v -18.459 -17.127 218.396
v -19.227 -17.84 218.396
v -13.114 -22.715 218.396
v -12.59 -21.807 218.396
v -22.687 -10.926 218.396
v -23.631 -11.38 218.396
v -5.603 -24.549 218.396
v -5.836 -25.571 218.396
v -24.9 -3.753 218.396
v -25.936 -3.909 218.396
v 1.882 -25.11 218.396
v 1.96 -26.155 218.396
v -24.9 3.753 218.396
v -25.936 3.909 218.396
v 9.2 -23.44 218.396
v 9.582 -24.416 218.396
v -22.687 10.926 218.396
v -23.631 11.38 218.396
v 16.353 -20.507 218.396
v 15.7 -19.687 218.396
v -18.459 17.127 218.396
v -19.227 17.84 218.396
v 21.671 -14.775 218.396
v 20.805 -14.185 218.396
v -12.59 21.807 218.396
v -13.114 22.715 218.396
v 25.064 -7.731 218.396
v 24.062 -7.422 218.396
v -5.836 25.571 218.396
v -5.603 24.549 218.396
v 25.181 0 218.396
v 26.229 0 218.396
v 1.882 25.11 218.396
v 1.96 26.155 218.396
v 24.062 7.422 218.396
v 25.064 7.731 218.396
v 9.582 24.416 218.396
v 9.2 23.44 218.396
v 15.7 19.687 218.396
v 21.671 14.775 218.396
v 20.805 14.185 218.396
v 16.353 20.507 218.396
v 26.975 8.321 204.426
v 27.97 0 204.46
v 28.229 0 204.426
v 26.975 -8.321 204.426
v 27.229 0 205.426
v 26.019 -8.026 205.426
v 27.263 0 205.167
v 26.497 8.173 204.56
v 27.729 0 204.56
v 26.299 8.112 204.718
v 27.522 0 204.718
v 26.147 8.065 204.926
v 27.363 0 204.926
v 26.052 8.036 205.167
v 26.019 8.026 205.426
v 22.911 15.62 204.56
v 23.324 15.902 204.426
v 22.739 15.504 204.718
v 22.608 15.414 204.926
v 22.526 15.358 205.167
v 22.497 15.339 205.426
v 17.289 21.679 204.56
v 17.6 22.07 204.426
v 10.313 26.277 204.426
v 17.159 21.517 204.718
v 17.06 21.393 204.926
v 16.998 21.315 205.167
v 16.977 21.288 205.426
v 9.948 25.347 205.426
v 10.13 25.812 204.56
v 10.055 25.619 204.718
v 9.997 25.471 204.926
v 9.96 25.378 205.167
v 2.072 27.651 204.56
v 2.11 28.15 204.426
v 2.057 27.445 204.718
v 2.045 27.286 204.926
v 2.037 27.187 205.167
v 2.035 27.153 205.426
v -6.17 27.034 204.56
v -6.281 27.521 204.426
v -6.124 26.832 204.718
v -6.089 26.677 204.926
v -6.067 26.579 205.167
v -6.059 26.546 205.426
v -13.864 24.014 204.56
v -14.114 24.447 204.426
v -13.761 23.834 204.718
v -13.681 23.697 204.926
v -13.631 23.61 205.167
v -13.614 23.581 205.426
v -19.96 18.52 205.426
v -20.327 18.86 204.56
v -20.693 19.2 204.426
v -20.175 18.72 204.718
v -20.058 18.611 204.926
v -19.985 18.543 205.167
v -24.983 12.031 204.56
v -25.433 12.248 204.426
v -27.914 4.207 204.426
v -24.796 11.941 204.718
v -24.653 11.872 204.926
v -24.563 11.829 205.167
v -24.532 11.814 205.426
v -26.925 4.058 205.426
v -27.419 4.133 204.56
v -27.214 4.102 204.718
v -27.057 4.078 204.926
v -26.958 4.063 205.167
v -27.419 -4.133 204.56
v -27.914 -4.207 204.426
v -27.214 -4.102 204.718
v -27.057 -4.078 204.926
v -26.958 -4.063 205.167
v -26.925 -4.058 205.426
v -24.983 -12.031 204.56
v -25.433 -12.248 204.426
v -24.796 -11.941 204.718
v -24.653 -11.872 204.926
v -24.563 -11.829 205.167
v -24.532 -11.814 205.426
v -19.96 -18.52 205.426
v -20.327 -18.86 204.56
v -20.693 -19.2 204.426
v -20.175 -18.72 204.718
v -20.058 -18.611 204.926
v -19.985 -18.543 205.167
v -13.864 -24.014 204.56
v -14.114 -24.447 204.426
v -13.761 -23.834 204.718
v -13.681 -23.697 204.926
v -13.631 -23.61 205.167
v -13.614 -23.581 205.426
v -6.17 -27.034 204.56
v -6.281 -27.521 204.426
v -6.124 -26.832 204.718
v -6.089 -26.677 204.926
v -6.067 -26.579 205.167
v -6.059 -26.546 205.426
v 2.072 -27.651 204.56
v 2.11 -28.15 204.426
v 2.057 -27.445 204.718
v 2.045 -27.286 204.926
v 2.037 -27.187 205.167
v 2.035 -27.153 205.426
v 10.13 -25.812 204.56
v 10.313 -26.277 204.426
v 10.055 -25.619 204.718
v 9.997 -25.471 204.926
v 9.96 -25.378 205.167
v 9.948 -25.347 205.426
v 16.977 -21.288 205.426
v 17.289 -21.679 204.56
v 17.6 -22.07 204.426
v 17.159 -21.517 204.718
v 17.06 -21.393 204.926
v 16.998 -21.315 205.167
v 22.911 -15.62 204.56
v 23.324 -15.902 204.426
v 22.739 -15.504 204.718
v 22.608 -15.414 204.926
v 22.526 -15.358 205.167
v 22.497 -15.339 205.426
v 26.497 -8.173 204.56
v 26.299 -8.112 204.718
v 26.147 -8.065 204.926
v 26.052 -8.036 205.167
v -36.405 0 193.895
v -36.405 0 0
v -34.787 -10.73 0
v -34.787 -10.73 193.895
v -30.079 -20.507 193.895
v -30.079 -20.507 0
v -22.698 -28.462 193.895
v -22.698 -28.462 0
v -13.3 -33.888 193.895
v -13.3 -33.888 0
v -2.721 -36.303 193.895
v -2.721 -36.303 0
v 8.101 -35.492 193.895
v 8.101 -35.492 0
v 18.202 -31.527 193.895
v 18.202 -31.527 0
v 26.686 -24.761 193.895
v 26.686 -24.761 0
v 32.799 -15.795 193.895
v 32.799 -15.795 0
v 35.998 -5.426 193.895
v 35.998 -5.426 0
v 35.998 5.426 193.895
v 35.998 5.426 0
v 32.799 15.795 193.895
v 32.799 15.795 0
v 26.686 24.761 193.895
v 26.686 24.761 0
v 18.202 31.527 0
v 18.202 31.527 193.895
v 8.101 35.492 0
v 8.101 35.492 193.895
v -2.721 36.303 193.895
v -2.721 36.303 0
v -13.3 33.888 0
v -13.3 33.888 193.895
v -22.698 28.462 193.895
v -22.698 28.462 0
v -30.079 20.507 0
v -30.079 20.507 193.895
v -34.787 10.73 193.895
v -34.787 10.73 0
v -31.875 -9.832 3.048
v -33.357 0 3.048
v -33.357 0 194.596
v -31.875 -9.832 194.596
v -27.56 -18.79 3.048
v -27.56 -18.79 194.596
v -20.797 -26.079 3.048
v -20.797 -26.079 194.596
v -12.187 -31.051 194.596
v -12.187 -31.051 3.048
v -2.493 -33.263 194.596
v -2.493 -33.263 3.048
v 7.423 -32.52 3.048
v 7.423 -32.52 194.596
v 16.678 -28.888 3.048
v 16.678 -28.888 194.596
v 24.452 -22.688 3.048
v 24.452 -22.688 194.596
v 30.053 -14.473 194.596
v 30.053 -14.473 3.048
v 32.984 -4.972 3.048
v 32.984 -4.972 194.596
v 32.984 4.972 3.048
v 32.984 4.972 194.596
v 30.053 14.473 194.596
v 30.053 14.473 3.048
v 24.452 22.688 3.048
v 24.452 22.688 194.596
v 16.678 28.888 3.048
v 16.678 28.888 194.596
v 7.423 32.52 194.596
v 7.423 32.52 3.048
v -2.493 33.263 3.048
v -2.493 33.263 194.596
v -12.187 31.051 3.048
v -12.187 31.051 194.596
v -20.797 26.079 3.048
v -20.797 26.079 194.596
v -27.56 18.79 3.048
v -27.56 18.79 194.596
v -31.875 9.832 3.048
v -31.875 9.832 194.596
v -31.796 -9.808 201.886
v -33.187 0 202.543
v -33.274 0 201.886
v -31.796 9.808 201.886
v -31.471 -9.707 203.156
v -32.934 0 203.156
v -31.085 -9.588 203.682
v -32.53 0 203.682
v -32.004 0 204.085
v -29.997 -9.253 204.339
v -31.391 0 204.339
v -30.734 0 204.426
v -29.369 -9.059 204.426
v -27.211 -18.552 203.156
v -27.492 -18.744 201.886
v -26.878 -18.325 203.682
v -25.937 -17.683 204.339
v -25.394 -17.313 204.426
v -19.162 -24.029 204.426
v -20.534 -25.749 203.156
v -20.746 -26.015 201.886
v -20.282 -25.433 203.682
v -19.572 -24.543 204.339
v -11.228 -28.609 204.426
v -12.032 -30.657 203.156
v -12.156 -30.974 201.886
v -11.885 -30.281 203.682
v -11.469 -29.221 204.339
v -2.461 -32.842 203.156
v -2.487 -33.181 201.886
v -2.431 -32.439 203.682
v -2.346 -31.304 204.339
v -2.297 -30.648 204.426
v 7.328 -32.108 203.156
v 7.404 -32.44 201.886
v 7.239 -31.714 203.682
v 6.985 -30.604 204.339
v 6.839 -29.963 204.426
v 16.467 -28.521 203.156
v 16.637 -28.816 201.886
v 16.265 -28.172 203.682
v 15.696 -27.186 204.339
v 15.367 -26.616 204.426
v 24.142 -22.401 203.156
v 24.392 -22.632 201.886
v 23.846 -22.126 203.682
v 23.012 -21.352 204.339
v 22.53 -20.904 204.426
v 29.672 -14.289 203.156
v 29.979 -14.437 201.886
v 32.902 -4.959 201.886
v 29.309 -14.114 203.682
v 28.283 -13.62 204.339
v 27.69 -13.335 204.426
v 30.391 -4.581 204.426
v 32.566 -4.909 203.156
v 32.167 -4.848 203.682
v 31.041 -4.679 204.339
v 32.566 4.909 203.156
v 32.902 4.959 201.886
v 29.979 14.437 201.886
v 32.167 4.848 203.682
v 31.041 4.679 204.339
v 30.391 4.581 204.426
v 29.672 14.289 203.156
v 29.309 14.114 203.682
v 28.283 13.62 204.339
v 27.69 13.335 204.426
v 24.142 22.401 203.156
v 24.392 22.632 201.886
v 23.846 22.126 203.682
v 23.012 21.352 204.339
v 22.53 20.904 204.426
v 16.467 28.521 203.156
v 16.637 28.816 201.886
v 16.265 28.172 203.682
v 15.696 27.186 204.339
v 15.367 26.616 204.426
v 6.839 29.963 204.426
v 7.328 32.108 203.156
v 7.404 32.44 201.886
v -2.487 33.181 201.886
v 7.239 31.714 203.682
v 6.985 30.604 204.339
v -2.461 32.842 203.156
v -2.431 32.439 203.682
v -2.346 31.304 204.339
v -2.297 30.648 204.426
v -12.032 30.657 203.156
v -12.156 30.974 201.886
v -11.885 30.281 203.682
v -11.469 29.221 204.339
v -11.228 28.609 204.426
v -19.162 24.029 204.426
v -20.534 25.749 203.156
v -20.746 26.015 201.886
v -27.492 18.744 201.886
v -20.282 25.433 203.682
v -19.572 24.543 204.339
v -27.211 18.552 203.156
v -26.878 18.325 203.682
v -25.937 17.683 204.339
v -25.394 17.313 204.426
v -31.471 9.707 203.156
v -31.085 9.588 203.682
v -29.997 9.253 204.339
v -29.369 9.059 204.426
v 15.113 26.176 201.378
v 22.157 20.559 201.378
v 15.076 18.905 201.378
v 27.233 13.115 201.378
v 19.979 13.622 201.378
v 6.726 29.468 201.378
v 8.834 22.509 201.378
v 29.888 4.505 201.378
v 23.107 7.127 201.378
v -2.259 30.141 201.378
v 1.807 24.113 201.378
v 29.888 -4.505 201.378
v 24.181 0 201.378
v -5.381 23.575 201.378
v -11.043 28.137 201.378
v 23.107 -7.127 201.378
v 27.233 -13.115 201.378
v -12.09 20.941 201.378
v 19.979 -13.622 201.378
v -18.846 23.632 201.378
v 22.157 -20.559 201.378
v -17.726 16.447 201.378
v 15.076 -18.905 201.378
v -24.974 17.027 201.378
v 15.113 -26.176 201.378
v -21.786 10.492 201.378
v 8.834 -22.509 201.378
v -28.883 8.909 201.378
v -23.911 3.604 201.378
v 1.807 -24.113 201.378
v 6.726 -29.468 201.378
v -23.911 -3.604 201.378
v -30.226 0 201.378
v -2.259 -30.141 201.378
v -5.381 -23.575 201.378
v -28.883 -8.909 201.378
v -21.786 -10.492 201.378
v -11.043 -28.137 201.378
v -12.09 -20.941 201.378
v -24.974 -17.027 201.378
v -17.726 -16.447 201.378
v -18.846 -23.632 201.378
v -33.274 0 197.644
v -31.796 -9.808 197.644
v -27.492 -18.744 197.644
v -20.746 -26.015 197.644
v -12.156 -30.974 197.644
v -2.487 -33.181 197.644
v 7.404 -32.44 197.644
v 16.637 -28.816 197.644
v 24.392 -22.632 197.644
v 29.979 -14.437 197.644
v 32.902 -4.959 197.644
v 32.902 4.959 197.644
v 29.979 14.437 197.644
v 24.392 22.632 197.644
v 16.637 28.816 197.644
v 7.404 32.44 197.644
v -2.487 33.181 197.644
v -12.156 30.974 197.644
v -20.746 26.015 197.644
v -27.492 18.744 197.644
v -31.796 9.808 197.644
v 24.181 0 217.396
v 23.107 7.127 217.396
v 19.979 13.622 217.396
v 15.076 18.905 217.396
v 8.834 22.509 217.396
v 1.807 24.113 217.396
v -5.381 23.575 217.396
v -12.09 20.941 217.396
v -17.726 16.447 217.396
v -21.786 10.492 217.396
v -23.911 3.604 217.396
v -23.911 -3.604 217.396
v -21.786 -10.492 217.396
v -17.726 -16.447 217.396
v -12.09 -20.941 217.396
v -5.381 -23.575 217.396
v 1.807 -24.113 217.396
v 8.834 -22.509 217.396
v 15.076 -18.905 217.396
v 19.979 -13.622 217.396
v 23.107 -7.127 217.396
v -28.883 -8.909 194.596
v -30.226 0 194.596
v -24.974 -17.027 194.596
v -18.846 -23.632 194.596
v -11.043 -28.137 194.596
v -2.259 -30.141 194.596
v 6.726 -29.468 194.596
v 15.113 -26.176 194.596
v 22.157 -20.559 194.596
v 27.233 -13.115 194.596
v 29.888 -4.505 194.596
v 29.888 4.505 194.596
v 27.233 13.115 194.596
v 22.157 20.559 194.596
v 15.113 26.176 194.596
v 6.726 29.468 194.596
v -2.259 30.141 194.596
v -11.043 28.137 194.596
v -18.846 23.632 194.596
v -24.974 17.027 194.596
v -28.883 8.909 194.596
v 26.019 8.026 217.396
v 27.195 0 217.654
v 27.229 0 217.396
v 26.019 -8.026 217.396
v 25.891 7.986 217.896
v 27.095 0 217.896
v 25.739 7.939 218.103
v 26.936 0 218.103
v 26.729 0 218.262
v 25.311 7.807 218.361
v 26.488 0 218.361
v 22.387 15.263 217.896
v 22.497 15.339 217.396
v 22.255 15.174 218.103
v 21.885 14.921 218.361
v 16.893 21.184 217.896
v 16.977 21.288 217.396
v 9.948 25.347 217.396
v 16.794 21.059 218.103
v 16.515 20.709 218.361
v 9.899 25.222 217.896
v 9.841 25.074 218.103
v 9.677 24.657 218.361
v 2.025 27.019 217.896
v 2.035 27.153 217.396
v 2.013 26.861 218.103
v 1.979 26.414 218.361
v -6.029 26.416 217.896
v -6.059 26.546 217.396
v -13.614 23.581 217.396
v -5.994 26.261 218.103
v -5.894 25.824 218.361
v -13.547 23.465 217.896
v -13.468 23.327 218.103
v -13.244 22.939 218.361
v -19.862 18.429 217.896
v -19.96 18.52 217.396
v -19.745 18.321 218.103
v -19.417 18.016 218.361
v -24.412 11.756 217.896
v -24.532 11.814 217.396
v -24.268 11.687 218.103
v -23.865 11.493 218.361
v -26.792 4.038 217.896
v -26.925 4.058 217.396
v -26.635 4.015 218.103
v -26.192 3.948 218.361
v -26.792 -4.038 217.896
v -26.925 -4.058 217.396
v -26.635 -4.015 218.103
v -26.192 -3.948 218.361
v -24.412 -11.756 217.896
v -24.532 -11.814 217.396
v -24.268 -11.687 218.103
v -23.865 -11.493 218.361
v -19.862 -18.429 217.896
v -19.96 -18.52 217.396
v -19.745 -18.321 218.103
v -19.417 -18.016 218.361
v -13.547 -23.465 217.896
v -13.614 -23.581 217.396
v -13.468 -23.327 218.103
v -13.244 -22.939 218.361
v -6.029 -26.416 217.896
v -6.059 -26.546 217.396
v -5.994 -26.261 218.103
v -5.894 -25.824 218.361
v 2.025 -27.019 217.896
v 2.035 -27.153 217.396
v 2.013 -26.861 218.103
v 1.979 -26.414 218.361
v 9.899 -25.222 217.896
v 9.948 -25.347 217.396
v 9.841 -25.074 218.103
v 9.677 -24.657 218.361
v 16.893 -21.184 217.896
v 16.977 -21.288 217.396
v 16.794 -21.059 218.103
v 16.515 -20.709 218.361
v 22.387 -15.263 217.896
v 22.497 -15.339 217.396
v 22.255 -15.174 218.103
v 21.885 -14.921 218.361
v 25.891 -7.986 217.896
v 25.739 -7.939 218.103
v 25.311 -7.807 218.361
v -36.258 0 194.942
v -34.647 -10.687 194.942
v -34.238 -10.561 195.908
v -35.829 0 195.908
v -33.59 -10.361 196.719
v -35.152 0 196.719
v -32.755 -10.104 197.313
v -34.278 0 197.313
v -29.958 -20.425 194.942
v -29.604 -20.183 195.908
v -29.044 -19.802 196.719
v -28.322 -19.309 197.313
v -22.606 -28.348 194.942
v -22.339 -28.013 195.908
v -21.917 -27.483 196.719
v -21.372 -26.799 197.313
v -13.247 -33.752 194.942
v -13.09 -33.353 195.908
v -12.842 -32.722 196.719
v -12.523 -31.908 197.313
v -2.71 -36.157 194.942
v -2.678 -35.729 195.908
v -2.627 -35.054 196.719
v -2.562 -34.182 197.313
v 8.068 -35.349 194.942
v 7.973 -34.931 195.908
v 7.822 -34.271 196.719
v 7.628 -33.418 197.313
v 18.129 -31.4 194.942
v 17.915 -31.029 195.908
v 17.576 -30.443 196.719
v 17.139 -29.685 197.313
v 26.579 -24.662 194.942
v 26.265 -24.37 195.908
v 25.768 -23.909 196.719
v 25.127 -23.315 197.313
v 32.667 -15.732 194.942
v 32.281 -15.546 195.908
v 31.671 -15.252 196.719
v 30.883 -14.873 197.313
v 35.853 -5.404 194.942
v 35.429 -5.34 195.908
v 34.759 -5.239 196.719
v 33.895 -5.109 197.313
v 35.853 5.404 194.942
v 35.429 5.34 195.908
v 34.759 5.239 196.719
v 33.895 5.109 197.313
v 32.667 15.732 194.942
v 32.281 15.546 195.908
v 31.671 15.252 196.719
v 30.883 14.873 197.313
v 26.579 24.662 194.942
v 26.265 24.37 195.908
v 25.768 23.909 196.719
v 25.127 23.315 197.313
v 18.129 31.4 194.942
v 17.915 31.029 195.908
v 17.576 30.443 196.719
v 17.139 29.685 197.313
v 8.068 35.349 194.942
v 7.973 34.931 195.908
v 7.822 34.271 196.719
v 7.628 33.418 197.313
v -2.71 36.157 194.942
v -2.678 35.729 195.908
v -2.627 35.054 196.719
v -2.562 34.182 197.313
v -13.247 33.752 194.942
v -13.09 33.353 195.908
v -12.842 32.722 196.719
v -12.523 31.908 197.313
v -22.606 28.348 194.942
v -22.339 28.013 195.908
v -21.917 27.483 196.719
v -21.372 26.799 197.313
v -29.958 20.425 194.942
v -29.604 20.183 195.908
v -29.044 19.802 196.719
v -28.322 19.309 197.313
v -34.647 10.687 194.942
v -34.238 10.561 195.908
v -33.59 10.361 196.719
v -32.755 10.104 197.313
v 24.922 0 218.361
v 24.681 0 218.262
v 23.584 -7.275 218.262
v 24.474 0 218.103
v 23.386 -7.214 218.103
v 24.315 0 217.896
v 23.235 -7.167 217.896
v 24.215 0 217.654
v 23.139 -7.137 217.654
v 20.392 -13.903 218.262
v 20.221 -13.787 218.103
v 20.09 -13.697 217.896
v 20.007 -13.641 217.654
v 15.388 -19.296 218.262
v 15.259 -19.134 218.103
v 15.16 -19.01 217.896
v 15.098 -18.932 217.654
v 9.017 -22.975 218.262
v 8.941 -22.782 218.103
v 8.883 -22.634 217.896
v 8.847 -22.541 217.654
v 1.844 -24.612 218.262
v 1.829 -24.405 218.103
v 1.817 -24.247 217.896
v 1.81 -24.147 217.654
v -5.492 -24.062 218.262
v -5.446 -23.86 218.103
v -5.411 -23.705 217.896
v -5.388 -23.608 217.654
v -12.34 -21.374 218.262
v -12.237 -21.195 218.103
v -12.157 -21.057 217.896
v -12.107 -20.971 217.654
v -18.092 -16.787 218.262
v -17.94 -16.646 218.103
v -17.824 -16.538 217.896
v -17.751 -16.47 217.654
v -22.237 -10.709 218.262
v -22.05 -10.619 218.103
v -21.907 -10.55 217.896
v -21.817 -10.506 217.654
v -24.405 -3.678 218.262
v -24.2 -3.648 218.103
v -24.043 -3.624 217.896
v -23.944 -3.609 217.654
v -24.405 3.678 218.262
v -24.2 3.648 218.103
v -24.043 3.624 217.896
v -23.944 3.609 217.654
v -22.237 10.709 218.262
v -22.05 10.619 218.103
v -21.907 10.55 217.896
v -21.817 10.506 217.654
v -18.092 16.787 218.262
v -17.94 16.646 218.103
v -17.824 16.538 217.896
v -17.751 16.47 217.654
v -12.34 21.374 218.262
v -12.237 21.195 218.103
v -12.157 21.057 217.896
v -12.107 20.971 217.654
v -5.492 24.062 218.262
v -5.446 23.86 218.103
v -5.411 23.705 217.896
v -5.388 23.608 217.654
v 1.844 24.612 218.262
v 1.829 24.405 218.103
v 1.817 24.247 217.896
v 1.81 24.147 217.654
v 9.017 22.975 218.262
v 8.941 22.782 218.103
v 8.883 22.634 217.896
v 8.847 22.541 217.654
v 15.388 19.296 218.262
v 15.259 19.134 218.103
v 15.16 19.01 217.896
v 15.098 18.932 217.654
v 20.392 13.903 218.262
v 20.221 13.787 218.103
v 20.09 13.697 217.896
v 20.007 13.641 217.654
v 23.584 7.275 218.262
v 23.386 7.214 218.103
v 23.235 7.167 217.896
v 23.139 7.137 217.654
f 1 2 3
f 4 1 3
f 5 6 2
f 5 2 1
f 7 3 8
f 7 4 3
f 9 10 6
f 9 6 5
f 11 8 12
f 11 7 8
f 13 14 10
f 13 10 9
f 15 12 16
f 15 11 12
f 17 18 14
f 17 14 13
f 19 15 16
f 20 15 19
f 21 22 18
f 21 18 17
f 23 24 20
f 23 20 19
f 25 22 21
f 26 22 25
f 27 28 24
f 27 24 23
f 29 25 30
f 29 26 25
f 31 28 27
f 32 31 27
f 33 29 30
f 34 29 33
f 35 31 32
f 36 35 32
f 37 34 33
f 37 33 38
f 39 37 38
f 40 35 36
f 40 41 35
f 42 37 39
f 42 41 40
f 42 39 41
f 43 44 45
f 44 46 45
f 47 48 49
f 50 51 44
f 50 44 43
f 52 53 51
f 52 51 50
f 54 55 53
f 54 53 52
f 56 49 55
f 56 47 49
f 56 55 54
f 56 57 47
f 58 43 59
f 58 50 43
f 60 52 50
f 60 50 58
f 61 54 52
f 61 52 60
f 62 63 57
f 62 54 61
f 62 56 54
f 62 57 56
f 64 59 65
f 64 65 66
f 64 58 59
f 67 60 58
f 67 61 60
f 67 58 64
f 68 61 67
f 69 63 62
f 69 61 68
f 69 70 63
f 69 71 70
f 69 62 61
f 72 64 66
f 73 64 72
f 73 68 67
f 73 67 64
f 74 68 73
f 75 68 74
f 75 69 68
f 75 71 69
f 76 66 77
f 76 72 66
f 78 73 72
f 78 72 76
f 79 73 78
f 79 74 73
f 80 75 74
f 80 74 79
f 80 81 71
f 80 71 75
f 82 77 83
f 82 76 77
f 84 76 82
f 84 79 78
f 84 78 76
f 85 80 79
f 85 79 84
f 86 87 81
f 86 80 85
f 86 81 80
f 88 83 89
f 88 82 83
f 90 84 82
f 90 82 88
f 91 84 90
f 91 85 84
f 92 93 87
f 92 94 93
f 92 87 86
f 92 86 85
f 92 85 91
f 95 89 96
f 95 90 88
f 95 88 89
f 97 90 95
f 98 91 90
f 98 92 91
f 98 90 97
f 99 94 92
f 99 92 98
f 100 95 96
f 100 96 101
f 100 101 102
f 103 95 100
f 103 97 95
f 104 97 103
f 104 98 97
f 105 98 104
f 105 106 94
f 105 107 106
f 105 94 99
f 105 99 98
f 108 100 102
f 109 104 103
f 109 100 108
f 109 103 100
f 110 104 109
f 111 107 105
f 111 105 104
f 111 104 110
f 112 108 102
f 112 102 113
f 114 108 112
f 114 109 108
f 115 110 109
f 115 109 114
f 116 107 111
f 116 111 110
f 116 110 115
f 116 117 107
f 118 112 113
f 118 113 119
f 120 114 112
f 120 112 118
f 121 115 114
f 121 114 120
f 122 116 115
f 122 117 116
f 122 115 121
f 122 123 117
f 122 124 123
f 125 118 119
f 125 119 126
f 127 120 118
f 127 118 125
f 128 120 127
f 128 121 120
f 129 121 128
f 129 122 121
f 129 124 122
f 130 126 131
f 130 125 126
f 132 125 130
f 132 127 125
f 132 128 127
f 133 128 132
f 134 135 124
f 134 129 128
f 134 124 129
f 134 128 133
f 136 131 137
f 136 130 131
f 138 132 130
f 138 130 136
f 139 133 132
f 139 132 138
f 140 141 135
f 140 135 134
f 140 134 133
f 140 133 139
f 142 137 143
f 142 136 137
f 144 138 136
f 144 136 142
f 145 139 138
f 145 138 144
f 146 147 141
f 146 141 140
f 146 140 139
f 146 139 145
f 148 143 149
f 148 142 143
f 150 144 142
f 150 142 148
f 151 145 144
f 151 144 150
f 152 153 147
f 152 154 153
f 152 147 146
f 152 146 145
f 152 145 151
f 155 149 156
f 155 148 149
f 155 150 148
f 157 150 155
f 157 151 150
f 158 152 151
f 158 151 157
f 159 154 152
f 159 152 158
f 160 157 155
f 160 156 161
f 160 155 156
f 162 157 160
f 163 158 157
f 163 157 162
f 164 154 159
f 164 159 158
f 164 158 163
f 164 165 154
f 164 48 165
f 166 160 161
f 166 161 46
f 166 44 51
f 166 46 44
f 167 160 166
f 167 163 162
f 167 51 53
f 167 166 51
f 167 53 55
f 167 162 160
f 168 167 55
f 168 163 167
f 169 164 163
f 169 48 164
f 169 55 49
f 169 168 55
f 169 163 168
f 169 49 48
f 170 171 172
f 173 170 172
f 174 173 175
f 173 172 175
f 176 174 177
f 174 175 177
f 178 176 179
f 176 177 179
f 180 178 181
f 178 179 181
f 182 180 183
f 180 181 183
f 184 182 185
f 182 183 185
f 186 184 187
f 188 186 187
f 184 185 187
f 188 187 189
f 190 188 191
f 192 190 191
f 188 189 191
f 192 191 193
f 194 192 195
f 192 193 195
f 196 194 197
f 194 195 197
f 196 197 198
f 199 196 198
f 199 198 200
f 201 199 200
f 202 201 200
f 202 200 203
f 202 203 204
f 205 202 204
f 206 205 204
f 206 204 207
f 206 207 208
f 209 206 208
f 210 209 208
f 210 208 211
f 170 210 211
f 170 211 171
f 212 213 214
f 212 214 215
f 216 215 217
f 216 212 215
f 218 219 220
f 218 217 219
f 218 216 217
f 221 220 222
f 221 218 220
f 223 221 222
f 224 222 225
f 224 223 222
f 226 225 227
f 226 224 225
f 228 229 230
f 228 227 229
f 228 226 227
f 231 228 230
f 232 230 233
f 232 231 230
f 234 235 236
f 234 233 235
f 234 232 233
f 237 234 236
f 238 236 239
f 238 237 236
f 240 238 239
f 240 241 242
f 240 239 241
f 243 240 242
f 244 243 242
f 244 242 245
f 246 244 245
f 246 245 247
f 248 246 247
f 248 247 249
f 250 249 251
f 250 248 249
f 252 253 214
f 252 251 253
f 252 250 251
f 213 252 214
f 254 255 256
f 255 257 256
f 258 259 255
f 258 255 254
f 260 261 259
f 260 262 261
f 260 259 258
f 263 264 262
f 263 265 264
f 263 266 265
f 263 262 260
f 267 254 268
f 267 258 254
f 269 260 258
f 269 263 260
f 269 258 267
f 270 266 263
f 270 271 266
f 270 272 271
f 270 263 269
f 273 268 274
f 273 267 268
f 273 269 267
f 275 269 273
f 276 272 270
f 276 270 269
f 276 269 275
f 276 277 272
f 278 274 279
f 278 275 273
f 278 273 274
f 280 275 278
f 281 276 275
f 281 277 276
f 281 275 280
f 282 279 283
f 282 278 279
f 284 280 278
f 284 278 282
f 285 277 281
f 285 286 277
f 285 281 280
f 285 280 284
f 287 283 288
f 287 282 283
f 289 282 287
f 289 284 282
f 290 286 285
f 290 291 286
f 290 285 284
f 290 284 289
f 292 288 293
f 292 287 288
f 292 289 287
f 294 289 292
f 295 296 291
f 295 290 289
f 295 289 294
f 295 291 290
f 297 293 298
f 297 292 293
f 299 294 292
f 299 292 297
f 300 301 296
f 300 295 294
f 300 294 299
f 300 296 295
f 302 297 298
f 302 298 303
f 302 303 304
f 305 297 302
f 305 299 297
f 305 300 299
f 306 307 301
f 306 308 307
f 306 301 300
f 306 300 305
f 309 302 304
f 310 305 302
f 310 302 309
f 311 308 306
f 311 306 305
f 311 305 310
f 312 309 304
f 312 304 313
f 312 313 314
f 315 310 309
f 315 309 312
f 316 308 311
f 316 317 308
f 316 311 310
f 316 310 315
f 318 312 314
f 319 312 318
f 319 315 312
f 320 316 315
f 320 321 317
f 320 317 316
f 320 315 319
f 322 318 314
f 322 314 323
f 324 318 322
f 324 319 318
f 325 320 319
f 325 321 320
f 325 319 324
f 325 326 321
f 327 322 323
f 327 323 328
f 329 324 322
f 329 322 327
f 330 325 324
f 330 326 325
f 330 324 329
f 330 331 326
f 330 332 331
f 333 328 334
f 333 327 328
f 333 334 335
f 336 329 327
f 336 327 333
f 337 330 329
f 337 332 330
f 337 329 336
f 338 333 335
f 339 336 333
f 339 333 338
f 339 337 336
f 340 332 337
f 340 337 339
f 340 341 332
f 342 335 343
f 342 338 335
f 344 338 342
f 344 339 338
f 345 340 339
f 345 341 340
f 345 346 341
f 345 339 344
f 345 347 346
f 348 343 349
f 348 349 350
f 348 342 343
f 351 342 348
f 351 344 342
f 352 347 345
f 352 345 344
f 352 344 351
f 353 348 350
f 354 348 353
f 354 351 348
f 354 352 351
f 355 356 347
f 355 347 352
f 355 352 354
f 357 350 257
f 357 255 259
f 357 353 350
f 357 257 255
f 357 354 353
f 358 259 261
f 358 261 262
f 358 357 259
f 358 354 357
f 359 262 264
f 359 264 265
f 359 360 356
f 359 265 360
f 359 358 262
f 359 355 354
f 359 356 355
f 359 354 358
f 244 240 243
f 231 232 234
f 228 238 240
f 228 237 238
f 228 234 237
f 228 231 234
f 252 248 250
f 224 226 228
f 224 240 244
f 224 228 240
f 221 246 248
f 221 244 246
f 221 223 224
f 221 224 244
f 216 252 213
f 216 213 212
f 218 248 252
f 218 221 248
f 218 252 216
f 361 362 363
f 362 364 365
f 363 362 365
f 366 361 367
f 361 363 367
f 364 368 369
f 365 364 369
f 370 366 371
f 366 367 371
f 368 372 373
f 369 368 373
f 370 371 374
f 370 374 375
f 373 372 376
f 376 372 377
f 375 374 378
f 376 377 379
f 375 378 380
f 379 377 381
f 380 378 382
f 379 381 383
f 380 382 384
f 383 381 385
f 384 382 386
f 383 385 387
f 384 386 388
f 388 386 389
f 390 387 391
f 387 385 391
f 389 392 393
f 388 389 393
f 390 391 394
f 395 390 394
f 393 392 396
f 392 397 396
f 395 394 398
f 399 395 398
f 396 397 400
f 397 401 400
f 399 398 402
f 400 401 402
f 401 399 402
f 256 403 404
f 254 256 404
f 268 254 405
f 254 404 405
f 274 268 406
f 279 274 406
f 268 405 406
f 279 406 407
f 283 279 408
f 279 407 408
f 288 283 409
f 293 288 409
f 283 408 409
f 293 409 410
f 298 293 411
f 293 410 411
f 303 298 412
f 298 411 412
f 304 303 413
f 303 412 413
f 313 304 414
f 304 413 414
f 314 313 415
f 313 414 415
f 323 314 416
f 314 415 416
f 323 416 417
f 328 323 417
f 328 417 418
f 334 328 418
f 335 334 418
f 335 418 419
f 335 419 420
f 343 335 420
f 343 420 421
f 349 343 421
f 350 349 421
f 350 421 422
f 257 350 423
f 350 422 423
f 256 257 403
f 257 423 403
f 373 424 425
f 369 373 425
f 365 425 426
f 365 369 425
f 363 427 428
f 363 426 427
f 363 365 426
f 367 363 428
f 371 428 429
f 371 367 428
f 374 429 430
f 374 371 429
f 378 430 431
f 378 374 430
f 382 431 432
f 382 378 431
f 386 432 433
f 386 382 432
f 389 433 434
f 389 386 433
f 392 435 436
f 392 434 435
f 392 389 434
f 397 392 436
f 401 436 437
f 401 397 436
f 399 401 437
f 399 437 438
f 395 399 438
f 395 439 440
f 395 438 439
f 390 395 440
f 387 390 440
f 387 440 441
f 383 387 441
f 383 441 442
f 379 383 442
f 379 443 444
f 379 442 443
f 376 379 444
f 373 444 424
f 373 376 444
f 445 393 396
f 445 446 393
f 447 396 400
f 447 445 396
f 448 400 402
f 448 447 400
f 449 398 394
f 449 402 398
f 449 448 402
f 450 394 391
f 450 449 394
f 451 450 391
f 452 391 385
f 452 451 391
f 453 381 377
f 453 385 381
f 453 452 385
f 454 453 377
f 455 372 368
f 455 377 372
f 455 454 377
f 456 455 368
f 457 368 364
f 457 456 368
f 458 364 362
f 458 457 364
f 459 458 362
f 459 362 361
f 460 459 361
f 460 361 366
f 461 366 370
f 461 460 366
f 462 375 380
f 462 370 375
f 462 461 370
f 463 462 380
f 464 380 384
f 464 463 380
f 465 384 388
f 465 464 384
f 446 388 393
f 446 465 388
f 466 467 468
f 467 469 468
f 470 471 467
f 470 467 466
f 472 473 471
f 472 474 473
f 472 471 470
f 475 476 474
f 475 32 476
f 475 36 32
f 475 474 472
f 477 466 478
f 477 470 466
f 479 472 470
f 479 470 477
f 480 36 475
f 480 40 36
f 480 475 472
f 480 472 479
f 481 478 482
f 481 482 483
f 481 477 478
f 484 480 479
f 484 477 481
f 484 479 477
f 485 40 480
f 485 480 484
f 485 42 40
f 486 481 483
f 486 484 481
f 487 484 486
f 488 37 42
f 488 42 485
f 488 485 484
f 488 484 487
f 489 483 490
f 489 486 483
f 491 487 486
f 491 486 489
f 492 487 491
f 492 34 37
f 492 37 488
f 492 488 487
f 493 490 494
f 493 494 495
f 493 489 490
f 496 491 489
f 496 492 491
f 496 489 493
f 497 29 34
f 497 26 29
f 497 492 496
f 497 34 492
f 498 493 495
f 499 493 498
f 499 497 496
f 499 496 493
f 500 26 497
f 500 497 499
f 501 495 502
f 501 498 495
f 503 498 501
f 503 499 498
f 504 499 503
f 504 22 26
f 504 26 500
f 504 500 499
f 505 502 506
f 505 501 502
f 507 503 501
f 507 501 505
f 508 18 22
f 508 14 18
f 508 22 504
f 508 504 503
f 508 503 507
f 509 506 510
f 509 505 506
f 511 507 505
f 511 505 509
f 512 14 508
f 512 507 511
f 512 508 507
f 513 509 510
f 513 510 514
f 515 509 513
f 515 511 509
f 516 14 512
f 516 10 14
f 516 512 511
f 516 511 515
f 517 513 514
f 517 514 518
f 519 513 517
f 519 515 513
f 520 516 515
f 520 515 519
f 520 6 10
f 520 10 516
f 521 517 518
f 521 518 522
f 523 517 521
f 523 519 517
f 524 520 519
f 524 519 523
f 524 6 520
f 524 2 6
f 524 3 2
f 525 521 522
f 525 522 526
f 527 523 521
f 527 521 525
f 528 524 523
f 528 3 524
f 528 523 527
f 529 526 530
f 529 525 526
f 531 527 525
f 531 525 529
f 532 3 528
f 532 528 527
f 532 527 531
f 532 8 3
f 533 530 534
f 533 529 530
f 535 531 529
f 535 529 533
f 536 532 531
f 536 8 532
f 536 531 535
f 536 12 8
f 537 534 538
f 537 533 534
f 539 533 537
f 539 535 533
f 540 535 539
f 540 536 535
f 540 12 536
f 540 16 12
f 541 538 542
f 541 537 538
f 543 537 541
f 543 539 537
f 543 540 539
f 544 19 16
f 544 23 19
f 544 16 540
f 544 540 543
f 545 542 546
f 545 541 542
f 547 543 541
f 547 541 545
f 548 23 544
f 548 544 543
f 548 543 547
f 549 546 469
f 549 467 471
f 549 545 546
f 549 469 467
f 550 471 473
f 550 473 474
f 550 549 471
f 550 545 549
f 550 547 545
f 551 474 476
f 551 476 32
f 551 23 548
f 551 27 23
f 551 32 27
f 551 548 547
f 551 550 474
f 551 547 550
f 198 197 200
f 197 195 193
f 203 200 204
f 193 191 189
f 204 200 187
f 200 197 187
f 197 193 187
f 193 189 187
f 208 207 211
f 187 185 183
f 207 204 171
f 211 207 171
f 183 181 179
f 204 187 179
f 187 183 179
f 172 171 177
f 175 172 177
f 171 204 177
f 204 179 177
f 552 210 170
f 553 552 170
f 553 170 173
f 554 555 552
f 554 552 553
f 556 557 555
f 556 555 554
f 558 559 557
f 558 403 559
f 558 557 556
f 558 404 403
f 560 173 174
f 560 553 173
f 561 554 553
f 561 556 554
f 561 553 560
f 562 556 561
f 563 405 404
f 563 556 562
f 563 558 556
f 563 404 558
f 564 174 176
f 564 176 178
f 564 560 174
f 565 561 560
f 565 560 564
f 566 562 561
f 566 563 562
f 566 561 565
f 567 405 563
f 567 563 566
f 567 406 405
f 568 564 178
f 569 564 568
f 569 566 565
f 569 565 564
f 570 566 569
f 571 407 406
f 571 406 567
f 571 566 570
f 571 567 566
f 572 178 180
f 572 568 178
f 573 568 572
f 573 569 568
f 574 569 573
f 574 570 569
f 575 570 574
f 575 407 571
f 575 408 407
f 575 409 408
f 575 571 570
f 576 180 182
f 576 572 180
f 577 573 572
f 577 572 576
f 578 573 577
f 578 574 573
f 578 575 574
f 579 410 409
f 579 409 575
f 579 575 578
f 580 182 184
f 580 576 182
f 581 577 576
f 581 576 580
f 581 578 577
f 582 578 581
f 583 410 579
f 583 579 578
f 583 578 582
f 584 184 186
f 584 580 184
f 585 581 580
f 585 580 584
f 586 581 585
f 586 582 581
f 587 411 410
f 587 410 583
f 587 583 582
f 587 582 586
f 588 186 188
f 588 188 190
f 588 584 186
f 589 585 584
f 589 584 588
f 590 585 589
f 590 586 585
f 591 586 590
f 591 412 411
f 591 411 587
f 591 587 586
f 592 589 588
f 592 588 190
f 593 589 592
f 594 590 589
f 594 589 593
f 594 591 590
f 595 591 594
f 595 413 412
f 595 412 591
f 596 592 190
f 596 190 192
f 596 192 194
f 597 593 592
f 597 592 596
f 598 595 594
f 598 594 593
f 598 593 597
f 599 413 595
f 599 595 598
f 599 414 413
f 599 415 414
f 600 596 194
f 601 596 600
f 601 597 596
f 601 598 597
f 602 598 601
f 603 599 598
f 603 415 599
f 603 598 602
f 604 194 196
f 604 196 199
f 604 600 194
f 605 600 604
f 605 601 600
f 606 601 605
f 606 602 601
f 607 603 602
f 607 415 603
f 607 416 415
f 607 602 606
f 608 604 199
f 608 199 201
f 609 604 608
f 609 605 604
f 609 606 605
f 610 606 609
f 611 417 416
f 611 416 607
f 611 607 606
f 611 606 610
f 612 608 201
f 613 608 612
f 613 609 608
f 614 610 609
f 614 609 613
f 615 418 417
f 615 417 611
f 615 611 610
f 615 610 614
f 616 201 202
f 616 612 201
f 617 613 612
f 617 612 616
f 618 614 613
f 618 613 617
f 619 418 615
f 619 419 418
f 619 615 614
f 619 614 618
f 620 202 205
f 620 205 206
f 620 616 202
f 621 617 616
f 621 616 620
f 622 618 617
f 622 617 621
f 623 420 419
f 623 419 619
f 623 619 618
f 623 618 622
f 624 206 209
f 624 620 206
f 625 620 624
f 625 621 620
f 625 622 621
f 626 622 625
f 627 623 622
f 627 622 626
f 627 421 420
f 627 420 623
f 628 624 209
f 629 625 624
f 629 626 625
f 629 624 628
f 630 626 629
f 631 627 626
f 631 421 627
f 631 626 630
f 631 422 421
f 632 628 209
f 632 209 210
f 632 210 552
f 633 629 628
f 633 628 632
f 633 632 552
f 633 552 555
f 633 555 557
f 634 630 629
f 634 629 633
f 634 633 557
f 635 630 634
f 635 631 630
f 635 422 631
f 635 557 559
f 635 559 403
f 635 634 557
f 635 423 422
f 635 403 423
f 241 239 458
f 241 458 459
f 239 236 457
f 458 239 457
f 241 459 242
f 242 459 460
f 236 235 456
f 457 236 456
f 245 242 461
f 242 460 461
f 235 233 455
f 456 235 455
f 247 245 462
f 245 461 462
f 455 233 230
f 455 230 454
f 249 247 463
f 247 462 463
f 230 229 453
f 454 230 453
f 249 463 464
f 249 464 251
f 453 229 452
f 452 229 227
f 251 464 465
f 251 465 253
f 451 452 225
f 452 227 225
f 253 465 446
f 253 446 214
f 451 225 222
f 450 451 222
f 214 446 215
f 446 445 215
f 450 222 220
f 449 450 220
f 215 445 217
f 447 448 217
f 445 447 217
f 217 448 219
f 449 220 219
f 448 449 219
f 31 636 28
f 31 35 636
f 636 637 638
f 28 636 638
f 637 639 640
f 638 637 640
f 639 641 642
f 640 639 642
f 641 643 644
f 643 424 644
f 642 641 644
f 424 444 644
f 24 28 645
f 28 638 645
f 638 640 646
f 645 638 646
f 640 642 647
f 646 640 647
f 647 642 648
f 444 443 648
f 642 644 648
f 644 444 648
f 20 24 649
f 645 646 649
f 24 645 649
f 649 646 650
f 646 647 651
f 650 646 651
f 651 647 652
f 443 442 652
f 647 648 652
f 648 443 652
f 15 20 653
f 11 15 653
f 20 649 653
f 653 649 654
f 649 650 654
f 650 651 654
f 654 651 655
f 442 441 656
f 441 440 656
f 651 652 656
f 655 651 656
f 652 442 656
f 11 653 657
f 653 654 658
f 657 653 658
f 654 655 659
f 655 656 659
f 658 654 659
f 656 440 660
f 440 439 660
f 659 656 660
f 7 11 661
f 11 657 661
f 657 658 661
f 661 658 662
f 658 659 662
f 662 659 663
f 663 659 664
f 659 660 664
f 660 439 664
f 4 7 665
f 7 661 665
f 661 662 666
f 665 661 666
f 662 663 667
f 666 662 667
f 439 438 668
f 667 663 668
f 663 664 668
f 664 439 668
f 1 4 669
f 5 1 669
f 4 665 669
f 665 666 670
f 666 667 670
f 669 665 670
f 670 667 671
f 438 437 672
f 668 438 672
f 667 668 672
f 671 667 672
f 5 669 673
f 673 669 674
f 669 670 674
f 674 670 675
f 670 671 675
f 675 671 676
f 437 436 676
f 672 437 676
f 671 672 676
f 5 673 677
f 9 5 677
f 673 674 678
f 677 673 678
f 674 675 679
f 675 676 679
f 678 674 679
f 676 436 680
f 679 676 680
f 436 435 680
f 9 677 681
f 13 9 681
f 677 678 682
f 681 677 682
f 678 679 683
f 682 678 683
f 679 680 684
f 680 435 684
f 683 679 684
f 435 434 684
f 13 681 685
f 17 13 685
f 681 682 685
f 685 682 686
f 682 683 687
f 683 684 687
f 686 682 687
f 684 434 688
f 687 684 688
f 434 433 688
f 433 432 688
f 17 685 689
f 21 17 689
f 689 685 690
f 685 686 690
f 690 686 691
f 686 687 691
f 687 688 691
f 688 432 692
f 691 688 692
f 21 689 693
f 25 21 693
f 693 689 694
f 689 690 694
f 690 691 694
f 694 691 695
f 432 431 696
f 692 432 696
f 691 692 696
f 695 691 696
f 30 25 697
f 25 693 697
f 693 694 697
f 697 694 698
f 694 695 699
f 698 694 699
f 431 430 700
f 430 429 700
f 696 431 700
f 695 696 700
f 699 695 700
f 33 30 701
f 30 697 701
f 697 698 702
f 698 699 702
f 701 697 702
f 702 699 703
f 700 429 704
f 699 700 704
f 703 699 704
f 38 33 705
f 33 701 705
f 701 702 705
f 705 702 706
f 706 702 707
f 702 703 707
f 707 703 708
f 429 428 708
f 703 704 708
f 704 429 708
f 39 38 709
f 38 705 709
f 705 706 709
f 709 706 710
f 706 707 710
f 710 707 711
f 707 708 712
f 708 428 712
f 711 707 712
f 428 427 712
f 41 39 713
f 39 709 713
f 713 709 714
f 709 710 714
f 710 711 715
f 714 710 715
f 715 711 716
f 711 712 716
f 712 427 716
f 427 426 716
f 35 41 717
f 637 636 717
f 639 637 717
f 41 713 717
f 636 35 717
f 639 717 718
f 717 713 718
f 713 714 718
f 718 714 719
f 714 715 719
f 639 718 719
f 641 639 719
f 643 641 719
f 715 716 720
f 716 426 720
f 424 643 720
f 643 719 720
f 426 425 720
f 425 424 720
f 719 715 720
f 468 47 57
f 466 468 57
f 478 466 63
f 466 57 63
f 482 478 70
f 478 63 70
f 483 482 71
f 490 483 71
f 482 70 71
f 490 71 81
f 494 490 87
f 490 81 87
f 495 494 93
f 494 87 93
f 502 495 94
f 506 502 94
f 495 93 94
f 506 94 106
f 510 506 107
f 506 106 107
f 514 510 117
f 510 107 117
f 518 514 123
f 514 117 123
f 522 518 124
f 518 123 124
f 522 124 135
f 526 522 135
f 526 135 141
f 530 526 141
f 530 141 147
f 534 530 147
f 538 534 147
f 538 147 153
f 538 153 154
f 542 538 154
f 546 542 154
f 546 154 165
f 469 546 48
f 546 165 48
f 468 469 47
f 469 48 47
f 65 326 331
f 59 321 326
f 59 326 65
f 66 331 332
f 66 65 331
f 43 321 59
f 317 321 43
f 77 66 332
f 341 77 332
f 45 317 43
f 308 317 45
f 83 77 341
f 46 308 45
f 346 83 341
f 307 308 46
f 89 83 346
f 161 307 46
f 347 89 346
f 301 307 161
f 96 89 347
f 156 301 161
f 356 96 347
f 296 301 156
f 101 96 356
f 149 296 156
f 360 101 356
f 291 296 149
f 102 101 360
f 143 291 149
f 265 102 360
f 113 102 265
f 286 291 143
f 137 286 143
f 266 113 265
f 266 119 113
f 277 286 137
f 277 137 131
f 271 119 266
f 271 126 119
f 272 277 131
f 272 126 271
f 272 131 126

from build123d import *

# Parameters (mm, degrees)
SKETCH1_R           = 36.40455
BOSS_EXTRUDE1_DEPTH = 197.64375
SKETCH2_R           = 33.274
BOSS_EXTRUDE2_DEPTH = 6.7818
SKETCH3_R           = 27.2288
BOSS_EXTRUDE3_DEPTH = 13.97
SHELL1_T            = -3.048
FILLET1_R           = 3.81
FILLET2_R           = 2.54
FILLET3_R           = 1
FILLET4_R           = 1.000000032


with BuildPart() as part:
    # Sketch1 → Boss-Extrude1 (new body)
    with BuildSketch(Plane.XY):
        with Locations(Location((0, 0, 0), (0, 0, 180))):
            Circle(SKETCH1_R)
    extrude(amount=BOSS_EXTRUDE1_DEPTH)

    # Sketch2 → Boss-Extrude2 (add)
    with BuildSketch(Plane.XY.offset(197.64375)):
        with Locations(Location((0, 0, 0), (0, 0, 180))):
            Circle(SKETCH2_R)
    extrude(amount=BOSS_EXTRUDE2_DEPTH)

    # Sketch3 → Boss-Extrude3 (add)
    with BuildSketch(Plane.XY.offset(204.42555)):
        Circle(SKETCH3_R)
    extrude(amount=BOSS_EXTRUDE3_DEPTH)

    # Shell1
    shell1_openings = [part.faces().sort_by_distance(p)[0] for p in [
        (0, 0, 218.39555),
    ]]
    offset(amount=SHELL1_T, openings=shell1_openings, kind=Kind.INTERSECTION)

    # Fillet1
    # the kernel refuses this fillet: 3.81 mm, written as the material it takes off along each edge
    with BuildSketch(Plane(origin=(0, 0, 197.64375), x_dir=(-1, 0, 0), z_dir=(0, 1, 0))) as fillet1_piece_1:
        with BuildLine():
            CenterArc((32.59455, -3.748926206), FILLET1_R, 0, 79.727303784)
            Line((33.274, 0), (33.287589, 0.074978524))
            ThreePointArc((33.287589, 0.074978524), (34.839275, 0.0762), (36.40455, 0.0762))
            Line((36.40455, 0.0762), (36.48075, 0))
            Line((36.48075, 0), (36.48075, -3.748926206))
            Line((36.48075, -3.748926206), (36.40455, -3.748926206))
        make_face()
    revolve(axis=Axis((0, 0, 197.64375), (0, 0, 1)), mode=Mode.SUBTRACT)

    # Fillet2
    fillet2_edges = [part.edges().sort_by_distance(p)[0] for p in [
        (33.274, 0, 204.42555),
    ]]
    fillet(fillet2_edges, radius=FILLET2_R)

    # Fillet3
    fillet3_edges = [part.edges().sort_by_distance(p)[0] for p in [
        (-27.2288, 0, 204.42555),
    ]]
    fillet(fillet3_edges, radius=FILLET3_R)

    # Fillet4
    fillet4_edges = [part.edges().sort_by_distance(p)[0] for p in [
        (-27.2288, 0, 218.39555),
        (-24.1808, 0, 218.39555),
    ]]
    fillet(fillet4_edges, radius=FILLET4_R)


solid = part.part
